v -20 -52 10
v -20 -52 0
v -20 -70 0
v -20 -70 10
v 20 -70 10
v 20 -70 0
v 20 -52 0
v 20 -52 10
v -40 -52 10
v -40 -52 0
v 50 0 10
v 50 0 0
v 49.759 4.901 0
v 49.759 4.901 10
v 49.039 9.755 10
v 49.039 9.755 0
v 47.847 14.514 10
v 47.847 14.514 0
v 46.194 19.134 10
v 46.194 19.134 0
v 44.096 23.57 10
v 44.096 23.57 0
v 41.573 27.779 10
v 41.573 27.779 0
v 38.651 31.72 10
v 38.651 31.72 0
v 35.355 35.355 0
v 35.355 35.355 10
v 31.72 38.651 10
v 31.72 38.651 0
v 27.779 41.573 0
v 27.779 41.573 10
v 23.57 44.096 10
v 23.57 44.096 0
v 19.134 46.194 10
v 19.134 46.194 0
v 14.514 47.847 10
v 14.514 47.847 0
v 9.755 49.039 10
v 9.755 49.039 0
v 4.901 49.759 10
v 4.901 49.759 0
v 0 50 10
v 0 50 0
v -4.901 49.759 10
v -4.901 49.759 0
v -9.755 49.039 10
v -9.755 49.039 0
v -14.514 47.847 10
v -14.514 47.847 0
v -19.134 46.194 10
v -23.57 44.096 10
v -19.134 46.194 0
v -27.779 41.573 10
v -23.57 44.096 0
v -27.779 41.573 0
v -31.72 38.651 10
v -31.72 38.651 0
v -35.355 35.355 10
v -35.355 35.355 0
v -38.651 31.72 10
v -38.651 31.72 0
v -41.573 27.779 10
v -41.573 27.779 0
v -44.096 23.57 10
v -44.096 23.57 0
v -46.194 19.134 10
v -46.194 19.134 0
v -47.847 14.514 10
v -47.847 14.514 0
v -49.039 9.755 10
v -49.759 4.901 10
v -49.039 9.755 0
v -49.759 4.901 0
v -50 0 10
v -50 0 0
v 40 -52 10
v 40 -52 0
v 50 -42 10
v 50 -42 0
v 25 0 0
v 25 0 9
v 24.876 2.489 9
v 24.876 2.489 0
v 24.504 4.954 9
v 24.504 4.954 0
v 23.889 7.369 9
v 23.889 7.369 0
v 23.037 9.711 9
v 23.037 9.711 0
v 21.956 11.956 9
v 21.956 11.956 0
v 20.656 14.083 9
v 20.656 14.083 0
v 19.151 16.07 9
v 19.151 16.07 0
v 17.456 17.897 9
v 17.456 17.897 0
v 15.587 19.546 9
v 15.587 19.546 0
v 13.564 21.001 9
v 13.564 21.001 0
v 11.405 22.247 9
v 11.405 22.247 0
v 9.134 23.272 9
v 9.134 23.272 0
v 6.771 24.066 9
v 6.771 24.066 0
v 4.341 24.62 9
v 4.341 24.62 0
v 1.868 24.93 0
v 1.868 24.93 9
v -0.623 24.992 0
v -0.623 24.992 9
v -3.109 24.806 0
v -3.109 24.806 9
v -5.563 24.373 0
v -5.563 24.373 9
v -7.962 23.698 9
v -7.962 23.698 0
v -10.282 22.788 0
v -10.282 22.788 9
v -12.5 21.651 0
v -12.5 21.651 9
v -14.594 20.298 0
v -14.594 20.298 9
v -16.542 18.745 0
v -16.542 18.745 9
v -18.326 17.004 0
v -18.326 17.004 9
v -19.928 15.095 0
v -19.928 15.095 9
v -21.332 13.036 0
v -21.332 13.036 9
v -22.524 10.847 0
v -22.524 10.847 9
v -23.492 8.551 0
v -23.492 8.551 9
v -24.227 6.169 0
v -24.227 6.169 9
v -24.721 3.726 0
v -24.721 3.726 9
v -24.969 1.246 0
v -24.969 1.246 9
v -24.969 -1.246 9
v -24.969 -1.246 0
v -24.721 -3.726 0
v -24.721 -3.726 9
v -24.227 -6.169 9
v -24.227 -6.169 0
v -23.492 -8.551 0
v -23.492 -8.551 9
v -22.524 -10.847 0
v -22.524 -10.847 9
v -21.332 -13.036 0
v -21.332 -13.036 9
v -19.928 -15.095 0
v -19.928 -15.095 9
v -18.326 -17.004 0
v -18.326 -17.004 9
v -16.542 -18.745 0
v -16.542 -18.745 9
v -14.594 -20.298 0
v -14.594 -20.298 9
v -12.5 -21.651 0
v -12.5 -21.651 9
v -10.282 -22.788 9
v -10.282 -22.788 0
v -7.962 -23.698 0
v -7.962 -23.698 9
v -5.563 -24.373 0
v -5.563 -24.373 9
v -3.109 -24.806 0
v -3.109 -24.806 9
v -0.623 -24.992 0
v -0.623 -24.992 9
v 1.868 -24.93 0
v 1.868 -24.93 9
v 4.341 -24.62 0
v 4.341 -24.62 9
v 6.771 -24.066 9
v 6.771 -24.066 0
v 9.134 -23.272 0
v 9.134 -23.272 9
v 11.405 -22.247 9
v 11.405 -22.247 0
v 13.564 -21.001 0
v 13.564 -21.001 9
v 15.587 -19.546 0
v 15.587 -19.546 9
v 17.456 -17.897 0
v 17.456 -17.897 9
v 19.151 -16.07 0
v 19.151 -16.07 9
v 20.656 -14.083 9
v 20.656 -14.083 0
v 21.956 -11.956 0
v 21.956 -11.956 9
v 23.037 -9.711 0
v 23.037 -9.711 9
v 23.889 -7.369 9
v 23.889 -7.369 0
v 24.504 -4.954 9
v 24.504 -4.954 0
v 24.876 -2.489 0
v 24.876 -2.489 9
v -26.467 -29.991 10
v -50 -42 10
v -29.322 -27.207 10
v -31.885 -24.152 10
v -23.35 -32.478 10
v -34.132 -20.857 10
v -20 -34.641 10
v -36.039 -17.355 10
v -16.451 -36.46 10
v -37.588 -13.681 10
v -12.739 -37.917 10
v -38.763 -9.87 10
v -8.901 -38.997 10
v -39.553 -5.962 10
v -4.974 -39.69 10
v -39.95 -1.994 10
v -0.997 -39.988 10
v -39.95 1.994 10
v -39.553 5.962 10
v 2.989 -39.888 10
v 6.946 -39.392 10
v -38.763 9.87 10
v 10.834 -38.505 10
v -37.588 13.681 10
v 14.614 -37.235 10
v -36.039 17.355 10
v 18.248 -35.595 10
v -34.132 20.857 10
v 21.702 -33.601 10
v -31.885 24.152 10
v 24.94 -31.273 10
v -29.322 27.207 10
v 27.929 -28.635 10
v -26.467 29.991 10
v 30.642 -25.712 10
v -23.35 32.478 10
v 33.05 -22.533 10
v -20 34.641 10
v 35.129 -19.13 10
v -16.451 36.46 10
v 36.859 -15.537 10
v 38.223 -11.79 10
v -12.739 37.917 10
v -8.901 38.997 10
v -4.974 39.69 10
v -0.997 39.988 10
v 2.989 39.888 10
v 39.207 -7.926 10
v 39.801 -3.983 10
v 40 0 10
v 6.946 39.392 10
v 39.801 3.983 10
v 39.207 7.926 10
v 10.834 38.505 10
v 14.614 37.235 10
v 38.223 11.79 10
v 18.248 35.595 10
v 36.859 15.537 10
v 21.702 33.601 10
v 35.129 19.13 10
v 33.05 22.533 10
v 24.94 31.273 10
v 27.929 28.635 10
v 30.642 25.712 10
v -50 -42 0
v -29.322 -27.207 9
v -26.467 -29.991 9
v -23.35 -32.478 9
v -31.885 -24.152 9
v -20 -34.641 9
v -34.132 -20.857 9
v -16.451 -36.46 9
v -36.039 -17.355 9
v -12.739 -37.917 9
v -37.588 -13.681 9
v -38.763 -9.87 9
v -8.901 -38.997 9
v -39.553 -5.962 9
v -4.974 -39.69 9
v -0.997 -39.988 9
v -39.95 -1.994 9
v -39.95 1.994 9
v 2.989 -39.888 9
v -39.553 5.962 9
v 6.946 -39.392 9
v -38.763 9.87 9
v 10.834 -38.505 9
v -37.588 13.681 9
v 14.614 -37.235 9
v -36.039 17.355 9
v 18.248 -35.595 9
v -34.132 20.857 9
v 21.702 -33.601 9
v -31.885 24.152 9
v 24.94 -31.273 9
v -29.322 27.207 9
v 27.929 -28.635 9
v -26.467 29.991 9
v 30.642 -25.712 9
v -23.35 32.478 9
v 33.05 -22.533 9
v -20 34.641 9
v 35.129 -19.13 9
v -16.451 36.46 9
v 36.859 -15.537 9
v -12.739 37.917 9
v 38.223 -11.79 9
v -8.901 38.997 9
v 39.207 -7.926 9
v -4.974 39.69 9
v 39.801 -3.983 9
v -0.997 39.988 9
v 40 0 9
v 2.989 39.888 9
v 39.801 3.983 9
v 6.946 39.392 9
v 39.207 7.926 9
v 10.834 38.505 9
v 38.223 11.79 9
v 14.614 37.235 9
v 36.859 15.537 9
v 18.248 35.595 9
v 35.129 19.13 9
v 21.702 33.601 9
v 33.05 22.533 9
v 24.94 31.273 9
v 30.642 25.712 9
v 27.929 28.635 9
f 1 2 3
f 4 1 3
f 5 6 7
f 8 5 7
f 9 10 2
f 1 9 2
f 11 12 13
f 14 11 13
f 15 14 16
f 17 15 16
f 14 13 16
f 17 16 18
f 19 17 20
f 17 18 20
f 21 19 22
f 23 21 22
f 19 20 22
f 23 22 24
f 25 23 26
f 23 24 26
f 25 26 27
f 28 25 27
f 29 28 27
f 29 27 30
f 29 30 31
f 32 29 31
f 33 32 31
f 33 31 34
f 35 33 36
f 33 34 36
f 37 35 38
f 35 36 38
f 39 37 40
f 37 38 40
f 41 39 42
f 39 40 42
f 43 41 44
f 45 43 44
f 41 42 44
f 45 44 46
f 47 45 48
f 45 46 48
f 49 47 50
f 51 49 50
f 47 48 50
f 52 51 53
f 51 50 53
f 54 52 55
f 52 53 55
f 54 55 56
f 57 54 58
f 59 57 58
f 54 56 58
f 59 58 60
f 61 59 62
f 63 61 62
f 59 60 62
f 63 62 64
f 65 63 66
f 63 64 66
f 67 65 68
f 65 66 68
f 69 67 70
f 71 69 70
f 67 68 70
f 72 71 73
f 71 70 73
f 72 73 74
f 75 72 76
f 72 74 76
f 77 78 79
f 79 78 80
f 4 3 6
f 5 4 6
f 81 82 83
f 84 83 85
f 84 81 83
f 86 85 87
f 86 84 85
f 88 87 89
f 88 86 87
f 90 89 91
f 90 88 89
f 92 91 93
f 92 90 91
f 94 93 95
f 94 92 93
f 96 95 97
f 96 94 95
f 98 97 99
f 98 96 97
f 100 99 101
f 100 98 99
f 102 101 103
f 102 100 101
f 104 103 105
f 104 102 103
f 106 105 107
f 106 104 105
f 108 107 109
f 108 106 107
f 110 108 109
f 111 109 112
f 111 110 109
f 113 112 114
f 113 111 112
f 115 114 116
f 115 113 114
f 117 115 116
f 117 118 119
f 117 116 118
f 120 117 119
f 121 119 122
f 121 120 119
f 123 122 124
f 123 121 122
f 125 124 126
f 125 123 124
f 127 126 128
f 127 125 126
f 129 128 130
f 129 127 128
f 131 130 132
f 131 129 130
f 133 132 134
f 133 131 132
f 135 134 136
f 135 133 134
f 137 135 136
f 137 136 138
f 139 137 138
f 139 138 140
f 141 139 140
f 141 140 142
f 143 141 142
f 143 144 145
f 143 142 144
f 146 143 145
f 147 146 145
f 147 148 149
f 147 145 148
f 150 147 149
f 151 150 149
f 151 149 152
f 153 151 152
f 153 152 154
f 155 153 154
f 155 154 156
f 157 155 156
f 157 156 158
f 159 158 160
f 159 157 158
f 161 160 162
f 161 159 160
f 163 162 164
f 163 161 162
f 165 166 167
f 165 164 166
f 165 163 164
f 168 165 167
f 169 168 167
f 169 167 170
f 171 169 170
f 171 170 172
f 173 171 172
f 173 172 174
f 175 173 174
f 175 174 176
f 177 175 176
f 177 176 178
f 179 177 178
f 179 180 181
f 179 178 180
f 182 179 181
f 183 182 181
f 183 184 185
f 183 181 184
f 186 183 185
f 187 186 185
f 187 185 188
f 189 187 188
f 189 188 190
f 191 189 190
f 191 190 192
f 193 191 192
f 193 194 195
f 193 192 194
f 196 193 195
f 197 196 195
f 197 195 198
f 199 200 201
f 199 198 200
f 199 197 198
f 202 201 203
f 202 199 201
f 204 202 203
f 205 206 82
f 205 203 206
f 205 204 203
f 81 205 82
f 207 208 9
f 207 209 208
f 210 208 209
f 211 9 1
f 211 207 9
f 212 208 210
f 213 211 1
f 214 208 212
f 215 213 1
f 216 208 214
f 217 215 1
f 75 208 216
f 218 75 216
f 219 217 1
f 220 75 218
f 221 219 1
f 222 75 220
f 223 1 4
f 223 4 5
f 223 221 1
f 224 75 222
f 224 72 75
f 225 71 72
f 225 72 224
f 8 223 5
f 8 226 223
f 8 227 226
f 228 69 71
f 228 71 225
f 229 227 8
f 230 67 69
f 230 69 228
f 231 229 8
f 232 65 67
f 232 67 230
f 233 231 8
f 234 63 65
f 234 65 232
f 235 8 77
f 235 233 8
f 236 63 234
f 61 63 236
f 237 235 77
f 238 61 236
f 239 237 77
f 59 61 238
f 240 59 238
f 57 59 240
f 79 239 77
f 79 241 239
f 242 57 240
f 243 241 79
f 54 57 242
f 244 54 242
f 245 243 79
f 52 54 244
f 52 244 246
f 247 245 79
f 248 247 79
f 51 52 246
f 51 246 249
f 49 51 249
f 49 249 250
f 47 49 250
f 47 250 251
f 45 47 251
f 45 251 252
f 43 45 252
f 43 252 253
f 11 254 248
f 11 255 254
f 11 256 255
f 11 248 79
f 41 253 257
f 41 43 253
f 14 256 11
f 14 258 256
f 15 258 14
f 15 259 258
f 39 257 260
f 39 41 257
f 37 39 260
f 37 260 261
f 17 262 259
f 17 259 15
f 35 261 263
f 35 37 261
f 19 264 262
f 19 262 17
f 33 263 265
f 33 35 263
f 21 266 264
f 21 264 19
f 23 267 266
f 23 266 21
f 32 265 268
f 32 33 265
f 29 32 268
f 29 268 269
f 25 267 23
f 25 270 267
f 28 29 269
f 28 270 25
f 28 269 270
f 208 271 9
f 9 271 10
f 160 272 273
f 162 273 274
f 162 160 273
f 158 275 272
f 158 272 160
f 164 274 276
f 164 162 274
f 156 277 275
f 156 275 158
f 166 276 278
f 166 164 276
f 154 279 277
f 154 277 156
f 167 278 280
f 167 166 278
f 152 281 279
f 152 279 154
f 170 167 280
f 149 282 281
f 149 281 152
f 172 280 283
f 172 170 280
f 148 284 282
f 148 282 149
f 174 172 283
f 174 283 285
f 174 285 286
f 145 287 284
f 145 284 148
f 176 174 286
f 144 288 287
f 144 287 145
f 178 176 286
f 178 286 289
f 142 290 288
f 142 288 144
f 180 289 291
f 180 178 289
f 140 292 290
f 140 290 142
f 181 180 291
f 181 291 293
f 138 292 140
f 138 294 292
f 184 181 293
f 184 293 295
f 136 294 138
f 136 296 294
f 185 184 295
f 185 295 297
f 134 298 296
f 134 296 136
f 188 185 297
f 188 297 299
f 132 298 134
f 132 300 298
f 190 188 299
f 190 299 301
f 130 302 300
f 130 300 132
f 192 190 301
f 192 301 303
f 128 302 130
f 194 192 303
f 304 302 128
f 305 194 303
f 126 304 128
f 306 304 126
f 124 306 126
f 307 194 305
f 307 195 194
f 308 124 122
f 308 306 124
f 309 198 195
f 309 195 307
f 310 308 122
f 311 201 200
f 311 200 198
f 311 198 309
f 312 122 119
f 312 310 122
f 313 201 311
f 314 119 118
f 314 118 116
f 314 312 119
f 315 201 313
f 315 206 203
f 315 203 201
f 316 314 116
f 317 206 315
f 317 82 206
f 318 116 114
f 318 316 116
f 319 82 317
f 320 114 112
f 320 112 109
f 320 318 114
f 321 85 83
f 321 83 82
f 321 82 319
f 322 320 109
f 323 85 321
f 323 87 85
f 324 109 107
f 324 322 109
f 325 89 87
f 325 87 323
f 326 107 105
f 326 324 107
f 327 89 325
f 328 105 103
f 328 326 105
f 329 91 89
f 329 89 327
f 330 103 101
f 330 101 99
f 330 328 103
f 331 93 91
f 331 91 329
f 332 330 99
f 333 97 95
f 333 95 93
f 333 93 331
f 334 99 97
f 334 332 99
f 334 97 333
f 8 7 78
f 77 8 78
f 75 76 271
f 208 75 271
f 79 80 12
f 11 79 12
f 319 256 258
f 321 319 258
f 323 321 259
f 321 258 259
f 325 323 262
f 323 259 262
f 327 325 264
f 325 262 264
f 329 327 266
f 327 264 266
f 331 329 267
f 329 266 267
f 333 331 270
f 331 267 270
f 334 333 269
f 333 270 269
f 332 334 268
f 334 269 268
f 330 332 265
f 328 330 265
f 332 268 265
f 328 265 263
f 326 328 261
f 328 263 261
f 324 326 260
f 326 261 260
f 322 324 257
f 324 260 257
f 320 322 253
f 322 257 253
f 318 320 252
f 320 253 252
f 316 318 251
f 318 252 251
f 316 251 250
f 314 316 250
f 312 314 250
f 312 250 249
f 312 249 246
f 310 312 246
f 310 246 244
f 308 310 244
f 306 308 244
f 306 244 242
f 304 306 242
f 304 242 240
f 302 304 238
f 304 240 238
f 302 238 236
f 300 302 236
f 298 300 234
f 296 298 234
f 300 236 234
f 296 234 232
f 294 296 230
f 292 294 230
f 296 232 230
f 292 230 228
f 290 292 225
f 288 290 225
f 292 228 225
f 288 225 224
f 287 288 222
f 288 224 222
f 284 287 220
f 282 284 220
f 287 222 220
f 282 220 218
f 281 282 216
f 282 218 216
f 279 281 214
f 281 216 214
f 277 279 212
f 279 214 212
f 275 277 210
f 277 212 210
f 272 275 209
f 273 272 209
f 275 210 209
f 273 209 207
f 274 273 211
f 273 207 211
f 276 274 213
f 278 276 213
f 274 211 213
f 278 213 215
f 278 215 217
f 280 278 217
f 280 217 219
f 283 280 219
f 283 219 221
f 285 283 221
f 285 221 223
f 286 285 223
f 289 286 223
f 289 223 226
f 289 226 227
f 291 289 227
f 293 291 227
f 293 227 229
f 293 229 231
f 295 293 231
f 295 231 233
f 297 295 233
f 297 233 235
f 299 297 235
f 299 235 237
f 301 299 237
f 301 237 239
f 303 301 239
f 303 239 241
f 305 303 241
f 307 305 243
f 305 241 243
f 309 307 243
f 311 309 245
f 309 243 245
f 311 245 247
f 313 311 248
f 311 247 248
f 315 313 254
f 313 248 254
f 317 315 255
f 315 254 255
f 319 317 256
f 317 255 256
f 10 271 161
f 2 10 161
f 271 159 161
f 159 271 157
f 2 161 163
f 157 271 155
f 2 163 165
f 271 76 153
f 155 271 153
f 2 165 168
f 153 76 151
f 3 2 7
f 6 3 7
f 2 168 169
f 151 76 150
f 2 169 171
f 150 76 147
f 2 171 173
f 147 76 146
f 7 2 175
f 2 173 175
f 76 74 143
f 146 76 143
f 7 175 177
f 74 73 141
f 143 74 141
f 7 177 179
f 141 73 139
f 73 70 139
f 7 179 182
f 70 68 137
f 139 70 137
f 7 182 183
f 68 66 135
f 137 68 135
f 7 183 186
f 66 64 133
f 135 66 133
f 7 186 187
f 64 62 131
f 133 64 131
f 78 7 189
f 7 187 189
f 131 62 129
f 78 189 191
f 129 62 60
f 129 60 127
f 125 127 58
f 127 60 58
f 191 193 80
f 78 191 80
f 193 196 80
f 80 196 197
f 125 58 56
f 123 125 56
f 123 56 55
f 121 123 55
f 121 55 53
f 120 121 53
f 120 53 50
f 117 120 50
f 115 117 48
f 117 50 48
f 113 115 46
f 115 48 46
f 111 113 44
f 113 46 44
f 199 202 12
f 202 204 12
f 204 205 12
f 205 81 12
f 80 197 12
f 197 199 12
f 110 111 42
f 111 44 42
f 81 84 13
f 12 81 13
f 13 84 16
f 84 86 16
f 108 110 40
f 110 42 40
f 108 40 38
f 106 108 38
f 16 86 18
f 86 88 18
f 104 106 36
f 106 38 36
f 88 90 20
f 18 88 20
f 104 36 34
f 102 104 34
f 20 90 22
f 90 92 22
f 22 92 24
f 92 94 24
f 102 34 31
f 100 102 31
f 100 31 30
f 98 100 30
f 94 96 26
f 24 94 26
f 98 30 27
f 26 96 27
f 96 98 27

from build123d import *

# Parameters (mm, degrees)
SKETCH_1_R          = 25
EXTRUDE_1_DEPTH     = 10
CUT_EXTRUDE_START   = 10
SKETCH_1_4_R        = 40
CUT_EXTRUDE_1_DEPTH = 1


with BuildPart() as part:
    # 草圖1 → 填料-伸長1 (new body)
    with BuildSketch(Plane.XY):
        with BuildLine():
            Line((-50, 0), (-50, -42))
            Line((-50, -42), (-40, -52))
            Line((-40, -52), (-20, -52))
            Line((-20, -52), (-20, -70))
            Line((-20, -70), (20, -70))
            Line((20, -70), (20, -52))
            Line((20, -52), (40, -52))
            Line((40, -52), (50, -42))
            Line((50, -42), (50, 0))
            ThreePointArc((50, 0), (0, 50), (-50, 0))
        make_face()
        Circle(SKETCH_1_R, mode=Mode.SUBTRACT)
    extrude(amount=EXTRUDE_1_DEPTH)

    # 草圖1<4> → 除料-伸長1 (cut)
    with BuildSketch(Plane.XY.offset(CUT_EXTRUDE_START)):
        Circle(SKETCH_1_4_R)
    extrude(amount=-CUT_EXTRUDE_1_DEPTH, mode=Mode.SUBTRACT)


solid = part.part
